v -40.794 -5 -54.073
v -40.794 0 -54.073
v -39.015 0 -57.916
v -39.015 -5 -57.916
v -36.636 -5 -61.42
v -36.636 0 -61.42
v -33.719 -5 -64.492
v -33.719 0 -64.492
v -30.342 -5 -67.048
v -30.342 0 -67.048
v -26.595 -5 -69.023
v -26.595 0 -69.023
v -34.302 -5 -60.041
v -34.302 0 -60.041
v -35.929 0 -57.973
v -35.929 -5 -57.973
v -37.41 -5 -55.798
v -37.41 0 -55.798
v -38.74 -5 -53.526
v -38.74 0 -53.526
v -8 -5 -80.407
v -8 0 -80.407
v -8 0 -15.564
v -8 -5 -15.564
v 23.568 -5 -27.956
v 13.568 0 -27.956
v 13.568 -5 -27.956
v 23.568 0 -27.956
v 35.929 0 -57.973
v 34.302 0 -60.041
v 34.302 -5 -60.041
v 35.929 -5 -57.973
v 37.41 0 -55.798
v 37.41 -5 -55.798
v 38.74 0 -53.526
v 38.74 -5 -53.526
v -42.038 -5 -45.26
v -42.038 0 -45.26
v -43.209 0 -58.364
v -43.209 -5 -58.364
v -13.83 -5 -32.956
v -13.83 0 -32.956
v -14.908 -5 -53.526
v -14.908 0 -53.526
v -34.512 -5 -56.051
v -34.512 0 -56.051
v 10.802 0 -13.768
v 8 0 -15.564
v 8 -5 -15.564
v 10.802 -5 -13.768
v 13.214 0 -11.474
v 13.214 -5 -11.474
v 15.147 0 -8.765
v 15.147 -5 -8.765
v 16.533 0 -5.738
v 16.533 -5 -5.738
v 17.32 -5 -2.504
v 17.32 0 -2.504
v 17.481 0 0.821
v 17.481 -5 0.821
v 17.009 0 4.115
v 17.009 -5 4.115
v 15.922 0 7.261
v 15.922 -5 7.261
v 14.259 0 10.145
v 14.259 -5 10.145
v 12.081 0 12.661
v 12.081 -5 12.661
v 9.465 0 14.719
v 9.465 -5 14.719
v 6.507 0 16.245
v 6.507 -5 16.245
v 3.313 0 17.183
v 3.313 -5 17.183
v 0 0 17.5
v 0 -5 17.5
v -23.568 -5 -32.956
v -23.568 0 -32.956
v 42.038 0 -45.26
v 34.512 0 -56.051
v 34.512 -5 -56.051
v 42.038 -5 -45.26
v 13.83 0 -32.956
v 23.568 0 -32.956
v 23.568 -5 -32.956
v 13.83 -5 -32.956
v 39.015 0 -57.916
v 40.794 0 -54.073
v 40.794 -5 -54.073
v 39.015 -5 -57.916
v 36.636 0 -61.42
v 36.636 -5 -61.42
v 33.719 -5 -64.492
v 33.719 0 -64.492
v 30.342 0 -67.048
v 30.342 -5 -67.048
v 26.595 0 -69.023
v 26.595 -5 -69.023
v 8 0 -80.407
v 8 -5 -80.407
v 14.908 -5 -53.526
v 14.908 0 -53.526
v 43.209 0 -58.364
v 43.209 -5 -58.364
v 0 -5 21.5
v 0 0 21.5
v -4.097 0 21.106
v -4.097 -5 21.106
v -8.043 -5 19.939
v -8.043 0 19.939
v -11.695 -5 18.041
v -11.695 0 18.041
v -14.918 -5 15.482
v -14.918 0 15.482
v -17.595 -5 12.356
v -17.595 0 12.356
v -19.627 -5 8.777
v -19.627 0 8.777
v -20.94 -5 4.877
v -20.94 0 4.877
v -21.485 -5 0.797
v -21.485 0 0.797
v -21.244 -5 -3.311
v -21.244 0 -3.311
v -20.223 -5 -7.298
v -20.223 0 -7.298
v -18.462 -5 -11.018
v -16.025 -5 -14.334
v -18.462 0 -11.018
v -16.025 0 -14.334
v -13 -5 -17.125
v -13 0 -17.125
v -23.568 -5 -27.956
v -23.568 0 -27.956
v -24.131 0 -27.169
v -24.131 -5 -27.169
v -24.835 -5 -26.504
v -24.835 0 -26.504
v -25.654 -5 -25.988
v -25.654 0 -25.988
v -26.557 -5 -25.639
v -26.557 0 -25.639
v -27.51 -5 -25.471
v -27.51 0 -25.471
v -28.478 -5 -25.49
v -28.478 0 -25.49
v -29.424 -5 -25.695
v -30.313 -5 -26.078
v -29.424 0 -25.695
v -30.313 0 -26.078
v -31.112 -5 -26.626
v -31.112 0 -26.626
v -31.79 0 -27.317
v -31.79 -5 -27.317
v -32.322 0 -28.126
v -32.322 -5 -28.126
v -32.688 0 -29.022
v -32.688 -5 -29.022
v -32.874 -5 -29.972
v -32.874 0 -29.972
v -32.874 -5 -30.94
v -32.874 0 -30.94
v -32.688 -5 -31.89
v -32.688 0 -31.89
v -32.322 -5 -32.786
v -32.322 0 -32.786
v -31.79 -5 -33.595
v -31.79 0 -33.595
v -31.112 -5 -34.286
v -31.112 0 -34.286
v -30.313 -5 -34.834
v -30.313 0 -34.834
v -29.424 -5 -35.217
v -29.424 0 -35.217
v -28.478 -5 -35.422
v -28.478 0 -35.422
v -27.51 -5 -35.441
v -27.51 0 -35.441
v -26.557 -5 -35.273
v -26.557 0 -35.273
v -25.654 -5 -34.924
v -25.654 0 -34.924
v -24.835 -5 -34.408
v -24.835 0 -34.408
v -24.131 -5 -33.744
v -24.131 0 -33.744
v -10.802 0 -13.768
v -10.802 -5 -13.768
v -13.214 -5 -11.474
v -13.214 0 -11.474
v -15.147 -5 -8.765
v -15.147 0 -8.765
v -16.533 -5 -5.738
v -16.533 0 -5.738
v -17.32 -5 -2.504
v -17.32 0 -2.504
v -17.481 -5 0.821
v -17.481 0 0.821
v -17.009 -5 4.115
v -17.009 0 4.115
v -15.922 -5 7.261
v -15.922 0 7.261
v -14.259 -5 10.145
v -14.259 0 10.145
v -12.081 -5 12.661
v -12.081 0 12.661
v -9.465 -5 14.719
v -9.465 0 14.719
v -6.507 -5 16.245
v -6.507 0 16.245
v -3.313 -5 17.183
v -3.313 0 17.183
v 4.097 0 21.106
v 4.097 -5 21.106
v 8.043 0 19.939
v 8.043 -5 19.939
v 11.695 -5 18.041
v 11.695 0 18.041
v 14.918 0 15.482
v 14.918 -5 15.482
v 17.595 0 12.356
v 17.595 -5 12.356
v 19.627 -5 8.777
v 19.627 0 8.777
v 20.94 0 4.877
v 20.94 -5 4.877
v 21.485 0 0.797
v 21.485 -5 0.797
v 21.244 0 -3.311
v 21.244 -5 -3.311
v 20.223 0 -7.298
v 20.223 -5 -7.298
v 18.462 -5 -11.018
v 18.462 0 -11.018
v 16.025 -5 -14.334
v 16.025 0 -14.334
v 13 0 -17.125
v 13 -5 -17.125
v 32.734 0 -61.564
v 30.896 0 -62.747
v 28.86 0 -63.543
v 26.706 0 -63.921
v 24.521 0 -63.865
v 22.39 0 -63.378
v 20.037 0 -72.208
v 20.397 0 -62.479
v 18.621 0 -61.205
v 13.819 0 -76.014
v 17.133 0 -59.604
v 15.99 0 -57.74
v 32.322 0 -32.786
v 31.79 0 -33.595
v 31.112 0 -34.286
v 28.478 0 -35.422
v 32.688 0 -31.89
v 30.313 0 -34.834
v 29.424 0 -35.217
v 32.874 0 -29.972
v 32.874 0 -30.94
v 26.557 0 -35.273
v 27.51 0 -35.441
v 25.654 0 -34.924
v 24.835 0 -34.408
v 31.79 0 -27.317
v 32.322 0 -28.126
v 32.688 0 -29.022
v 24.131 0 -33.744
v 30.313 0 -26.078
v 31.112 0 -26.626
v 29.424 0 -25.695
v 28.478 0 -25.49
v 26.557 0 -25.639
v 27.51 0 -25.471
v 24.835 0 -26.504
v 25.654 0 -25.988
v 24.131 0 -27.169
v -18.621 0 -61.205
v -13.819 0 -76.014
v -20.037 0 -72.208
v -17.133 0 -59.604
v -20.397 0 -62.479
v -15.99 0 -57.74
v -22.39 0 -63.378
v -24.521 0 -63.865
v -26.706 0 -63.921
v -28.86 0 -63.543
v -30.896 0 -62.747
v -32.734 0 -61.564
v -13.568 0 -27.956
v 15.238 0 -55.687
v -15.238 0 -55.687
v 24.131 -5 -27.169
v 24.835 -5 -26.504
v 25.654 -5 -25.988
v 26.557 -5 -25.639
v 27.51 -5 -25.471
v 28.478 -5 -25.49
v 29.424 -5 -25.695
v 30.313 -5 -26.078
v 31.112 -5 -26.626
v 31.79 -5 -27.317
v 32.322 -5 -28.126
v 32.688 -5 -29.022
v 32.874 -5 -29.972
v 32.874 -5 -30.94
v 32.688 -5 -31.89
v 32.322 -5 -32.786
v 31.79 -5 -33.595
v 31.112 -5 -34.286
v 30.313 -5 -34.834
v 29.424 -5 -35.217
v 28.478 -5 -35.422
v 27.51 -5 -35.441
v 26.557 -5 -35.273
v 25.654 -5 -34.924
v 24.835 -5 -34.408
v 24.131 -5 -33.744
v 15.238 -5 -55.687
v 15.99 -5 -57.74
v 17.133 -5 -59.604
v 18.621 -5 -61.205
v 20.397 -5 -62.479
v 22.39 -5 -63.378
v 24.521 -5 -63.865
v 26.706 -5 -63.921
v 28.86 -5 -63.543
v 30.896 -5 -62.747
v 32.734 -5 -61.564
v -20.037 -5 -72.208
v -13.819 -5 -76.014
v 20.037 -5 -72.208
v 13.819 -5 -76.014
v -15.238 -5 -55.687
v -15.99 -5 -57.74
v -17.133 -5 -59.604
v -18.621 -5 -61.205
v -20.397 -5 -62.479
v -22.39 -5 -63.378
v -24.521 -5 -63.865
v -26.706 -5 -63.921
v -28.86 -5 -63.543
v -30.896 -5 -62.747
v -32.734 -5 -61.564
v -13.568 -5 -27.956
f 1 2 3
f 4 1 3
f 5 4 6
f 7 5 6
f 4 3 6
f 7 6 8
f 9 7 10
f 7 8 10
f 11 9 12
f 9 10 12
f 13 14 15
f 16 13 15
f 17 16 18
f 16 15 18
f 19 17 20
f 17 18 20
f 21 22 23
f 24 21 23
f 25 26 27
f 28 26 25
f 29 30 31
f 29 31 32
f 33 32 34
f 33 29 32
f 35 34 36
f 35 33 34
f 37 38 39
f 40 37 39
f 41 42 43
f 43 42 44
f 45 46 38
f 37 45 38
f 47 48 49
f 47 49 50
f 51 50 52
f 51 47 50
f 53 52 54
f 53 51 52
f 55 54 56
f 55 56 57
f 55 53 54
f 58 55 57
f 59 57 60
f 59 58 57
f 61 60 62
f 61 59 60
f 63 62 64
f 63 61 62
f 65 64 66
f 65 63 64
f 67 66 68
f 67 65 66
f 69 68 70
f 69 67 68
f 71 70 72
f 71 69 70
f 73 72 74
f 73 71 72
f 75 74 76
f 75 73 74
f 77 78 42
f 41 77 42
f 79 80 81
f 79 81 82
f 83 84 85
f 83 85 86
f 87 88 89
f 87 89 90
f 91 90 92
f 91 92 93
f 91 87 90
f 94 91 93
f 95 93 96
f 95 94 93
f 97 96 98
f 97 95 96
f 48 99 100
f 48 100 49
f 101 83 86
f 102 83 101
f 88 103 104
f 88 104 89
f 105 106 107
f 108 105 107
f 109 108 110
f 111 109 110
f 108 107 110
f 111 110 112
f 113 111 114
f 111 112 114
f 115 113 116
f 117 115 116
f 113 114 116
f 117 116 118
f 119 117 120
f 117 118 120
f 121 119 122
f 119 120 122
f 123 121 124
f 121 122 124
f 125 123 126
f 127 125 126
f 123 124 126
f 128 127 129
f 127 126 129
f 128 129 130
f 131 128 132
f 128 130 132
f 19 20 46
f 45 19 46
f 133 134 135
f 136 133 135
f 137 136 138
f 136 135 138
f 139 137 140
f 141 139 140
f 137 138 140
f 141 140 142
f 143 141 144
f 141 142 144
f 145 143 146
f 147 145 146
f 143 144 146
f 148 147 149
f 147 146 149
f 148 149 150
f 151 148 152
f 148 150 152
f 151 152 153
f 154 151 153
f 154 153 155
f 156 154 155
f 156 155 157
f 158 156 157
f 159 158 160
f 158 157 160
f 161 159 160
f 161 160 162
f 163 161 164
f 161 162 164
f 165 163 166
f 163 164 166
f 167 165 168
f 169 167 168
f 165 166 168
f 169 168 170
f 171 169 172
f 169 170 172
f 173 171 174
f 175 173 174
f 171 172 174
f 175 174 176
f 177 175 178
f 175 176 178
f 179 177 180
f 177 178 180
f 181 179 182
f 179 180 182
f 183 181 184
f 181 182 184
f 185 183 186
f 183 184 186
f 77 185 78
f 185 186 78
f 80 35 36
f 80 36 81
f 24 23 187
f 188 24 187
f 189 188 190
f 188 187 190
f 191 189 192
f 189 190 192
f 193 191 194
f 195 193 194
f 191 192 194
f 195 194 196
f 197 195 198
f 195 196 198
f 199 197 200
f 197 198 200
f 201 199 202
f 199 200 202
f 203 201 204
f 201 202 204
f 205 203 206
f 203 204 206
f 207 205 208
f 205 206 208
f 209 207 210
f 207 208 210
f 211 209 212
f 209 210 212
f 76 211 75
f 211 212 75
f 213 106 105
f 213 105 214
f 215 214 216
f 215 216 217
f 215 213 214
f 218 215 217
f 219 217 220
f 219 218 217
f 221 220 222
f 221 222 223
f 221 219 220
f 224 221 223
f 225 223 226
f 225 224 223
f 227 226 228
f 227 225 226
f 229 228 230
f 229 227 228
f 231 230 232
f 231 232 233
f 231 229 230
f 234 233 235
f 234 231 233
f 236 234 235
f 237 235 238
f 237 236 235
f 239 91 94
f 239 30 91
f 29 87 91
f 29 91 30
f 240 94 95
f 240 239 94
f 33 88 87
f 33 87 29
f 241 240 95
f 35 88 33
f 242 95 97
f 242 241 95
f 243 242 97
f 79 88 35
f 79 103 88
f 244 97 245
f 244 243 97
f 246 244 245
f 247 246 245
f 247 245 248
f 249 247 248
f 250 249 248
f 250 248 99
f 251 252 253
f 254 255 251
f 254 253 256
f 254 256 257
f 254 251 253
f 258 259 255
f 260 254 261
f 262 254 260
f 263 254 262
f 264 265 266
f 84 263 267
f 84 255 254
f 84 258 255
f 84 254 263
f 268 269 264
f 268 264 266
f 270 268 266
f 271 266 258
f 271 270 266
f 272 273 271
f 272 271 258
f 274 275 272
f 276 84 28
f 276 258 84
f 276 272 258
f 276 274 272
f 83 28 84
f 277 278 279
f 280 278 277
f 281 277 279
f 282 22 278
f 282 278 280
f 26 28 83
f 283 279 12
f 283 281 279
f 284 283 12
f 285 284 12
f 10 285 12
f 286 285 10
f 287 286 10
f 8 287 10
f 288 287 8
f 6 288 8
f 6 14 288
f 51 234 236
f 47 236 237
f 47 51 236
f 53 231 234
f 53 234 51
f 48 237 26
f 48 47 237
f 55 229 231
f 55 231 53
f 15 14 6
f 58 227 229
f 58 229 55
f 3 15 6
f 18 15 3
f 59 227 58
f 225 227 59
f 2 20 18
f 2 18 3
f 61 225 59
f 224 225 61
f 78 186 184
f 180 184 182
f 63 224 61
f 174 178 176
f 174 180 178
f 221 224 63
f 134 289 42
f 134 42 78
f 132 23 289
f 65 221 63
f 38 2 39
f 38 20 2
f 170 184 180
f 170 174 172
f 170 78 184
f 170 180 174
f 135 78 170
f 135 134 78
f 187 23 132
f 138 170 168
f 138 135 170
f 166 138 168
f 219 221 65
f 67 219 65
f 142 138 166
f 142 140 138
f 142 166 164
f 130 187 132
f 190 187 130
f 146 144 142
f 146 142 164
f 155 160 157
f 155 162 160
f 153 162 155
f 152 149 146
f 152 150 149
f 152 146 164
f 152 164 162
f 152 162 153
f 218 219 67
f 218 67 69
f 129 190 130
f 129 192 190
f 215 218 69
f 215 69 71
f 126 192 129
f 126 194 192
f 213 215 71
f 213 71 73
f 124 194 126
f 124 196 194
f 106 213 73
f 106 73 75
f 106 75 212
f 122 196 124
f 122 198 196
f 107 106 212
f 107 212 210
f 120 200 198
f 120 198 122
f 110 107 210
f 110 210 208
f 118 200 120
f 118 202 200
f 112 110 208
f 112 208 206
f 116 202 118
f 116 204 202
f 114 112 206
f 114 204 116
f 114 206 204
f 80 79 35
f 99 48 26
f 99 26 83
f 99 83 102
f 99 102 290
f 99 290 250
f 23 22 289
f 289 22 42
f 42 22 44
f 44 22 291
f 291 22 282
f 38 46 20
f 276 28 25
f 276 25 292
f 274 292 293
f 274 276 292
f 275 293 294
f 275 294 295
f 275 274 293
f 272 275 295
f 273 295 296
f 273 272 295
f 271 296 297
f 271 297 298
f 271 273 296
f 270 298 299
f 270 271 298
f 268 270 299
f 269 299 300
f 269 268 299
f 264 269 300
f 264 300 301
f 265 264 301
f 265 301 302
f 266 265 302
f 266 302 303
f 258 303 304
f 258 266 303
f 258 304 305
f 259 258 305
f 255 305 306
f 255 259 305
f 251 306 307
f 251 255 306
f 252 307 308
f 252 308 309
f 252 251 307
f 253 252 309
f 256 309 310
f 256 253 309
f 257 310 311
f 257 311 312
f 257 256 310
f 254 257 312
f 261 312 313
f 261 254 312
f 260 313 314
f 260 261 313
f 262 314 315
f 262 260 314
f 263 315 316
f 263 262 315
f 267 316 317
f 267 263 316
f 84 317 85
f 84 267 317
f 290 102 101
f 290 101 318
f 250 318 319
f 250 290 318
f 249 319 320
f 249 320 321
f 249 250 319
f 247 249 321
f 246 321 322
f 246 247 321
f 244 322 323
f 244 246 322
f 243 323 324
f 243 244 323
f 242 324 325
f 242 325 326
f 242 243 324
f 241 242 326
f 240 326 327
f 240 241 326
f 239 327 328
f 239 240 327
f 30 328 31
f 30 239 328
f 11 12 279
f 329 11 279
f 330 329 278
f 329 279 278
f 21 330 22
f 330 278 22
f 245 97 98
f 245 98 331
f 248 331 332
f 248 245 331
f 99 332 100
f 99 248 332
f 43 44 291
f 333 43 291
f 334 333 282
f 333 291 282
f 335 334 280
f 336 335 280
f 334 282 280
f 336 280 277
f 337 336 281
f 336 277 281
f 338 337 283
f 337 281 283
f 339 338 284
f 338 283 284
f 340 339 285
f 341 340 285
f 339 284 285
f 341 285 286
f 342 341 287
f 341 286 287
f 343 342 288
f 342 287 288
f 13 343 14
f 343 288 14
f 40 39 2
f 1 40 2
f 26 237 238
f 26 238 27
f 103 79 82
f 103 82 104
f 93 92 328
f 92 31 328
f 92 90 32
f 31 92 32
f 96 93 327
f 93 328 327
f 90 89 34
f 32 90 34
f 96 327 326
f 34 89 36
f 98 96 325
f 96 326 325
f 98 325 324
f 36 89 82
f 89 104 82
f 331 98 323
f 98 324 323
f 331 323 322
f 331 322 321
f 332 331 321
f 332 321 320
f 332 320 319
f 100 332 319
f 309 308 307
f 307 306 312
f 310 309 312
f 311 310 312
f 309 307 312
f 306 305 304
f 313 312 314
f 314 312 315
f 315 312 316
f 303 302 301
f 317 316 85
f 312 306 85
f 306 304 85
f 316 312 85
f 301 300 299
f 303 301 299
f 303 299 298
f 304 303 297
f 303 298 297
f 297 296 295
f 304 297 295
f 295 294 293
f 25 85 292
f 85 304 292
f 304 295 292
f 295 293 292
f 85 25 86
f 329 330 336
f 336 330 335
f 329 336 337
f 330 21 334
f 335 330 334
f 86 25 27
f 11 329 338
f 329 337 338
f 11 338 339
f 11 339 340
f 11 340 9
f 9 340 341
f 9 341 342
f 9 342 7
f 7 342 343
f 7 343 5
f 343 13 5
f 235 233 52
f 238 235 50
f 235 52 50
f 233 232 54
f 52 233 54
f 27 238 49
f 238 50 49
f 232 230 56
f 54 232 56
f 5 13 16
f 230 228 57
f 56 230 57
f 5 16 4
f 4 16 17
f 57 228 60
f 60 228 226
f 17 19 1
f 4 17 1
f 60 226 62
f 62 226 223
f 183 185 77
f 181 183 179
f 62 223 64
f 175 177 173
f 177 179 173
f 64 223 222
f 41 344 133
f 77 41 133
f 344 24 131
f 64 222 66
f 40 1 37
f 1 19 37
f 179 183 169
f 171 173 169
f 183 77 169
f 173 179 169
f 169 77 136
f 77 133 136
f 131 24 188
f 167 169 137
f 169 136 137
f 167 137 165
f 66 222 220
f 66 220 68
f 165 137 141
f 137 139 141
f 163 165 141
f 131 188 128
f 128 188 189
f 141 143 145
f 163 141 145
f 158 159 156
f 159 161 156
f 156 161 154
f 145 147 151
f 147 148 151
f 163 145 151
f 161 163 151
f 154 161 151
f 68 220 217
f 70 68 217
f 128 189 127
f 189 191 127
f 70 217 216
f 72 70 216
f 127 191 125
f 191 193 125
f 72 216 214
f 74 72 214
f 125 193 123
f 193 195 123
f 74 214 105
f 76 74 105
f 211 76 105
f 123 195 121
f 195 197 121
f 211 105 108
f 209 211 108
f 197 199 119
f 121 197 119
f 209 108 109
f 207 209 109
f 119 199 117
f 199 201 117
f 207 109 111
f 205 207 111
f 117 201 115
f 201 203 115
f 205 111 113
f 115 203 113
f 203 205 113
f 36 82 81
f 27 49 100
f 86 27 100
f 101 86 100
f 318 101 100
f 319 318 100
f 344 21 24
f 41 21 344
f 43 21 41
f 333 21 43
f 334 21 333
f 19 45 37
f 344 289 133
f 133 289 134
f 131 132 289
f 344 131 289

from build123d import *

# Parameters (mm, degrees)
F1_DEPTH = 5


with BuildPart() as f1:
    # F0 (on Front) → F1 (new body)
    with BuildSketch(Plane.XZ):
        with BuildLine():
            Line((0, 17.5), (0, 21.5))
            ThreePointArc((0, 21.5), (-20.376797, 6.858291), (-13, -17.124544))
            Line((-13, -17.124544), (-13.567663, -27.956202))
            Line((-13.567663, -27.956202), (-23.567663, -27.956202))
            ThreePointArc((-23.567663, -27.956202), (-32.89779, -30.456202), (-23.567663, -32.956202))
            Line((-23.567663, -32.956202), (-13.829702, -32.956202))
            Line((-13.829702, -32.956202), (-14.907737, -53.526337))
            ThreePointArc((-14.907737, -53.526337), (-22.389872, -63.378031), (-34.302261, -60.041385))
            ThreePointArc((-34.302261, -60.041385), (-36.688307, -56.897738), (-38.739987, -53.526337))
            Line((-38.739987, -53.526337), (-34.511764, -56.051488))
            Line((-34.511764, -56.051488), (-42.037944, -45.259527))
            Line((-42.037944, -45.259527), (-43.209494, -58.364384))
            Line((-43.209494, -58.364384), (-40.79404, -54.07255))
            ThreePointArc((-40.79404, -54.07255), (-35.239888, -63.015457), (-26.595041, -69.023021))
            ThreePointArc((-26.595041, -69.023021), (-16.881661, -74.035451), (-8, -80.406505))
            Line((-8, -80.406505), (-8, -19.956202))
            Line((-8, -19.956202), (-8, -15.564382))
            ThreePointArc((-8, -15.564382), (-17.009214, 4.115417), (0, 17.5))
        make_face()
    extrude(amount=F1_DEPTH)

    # F2: F1 across face


with BuildPart() as f1_1:
    add(f1.part)
    add(f1.part.mirror(Plane(origin=(0, -2.5, 19.5), x_dir=(0, 1, 0), z_dir=(1, 0, 0))))


solid = f1_1.part
